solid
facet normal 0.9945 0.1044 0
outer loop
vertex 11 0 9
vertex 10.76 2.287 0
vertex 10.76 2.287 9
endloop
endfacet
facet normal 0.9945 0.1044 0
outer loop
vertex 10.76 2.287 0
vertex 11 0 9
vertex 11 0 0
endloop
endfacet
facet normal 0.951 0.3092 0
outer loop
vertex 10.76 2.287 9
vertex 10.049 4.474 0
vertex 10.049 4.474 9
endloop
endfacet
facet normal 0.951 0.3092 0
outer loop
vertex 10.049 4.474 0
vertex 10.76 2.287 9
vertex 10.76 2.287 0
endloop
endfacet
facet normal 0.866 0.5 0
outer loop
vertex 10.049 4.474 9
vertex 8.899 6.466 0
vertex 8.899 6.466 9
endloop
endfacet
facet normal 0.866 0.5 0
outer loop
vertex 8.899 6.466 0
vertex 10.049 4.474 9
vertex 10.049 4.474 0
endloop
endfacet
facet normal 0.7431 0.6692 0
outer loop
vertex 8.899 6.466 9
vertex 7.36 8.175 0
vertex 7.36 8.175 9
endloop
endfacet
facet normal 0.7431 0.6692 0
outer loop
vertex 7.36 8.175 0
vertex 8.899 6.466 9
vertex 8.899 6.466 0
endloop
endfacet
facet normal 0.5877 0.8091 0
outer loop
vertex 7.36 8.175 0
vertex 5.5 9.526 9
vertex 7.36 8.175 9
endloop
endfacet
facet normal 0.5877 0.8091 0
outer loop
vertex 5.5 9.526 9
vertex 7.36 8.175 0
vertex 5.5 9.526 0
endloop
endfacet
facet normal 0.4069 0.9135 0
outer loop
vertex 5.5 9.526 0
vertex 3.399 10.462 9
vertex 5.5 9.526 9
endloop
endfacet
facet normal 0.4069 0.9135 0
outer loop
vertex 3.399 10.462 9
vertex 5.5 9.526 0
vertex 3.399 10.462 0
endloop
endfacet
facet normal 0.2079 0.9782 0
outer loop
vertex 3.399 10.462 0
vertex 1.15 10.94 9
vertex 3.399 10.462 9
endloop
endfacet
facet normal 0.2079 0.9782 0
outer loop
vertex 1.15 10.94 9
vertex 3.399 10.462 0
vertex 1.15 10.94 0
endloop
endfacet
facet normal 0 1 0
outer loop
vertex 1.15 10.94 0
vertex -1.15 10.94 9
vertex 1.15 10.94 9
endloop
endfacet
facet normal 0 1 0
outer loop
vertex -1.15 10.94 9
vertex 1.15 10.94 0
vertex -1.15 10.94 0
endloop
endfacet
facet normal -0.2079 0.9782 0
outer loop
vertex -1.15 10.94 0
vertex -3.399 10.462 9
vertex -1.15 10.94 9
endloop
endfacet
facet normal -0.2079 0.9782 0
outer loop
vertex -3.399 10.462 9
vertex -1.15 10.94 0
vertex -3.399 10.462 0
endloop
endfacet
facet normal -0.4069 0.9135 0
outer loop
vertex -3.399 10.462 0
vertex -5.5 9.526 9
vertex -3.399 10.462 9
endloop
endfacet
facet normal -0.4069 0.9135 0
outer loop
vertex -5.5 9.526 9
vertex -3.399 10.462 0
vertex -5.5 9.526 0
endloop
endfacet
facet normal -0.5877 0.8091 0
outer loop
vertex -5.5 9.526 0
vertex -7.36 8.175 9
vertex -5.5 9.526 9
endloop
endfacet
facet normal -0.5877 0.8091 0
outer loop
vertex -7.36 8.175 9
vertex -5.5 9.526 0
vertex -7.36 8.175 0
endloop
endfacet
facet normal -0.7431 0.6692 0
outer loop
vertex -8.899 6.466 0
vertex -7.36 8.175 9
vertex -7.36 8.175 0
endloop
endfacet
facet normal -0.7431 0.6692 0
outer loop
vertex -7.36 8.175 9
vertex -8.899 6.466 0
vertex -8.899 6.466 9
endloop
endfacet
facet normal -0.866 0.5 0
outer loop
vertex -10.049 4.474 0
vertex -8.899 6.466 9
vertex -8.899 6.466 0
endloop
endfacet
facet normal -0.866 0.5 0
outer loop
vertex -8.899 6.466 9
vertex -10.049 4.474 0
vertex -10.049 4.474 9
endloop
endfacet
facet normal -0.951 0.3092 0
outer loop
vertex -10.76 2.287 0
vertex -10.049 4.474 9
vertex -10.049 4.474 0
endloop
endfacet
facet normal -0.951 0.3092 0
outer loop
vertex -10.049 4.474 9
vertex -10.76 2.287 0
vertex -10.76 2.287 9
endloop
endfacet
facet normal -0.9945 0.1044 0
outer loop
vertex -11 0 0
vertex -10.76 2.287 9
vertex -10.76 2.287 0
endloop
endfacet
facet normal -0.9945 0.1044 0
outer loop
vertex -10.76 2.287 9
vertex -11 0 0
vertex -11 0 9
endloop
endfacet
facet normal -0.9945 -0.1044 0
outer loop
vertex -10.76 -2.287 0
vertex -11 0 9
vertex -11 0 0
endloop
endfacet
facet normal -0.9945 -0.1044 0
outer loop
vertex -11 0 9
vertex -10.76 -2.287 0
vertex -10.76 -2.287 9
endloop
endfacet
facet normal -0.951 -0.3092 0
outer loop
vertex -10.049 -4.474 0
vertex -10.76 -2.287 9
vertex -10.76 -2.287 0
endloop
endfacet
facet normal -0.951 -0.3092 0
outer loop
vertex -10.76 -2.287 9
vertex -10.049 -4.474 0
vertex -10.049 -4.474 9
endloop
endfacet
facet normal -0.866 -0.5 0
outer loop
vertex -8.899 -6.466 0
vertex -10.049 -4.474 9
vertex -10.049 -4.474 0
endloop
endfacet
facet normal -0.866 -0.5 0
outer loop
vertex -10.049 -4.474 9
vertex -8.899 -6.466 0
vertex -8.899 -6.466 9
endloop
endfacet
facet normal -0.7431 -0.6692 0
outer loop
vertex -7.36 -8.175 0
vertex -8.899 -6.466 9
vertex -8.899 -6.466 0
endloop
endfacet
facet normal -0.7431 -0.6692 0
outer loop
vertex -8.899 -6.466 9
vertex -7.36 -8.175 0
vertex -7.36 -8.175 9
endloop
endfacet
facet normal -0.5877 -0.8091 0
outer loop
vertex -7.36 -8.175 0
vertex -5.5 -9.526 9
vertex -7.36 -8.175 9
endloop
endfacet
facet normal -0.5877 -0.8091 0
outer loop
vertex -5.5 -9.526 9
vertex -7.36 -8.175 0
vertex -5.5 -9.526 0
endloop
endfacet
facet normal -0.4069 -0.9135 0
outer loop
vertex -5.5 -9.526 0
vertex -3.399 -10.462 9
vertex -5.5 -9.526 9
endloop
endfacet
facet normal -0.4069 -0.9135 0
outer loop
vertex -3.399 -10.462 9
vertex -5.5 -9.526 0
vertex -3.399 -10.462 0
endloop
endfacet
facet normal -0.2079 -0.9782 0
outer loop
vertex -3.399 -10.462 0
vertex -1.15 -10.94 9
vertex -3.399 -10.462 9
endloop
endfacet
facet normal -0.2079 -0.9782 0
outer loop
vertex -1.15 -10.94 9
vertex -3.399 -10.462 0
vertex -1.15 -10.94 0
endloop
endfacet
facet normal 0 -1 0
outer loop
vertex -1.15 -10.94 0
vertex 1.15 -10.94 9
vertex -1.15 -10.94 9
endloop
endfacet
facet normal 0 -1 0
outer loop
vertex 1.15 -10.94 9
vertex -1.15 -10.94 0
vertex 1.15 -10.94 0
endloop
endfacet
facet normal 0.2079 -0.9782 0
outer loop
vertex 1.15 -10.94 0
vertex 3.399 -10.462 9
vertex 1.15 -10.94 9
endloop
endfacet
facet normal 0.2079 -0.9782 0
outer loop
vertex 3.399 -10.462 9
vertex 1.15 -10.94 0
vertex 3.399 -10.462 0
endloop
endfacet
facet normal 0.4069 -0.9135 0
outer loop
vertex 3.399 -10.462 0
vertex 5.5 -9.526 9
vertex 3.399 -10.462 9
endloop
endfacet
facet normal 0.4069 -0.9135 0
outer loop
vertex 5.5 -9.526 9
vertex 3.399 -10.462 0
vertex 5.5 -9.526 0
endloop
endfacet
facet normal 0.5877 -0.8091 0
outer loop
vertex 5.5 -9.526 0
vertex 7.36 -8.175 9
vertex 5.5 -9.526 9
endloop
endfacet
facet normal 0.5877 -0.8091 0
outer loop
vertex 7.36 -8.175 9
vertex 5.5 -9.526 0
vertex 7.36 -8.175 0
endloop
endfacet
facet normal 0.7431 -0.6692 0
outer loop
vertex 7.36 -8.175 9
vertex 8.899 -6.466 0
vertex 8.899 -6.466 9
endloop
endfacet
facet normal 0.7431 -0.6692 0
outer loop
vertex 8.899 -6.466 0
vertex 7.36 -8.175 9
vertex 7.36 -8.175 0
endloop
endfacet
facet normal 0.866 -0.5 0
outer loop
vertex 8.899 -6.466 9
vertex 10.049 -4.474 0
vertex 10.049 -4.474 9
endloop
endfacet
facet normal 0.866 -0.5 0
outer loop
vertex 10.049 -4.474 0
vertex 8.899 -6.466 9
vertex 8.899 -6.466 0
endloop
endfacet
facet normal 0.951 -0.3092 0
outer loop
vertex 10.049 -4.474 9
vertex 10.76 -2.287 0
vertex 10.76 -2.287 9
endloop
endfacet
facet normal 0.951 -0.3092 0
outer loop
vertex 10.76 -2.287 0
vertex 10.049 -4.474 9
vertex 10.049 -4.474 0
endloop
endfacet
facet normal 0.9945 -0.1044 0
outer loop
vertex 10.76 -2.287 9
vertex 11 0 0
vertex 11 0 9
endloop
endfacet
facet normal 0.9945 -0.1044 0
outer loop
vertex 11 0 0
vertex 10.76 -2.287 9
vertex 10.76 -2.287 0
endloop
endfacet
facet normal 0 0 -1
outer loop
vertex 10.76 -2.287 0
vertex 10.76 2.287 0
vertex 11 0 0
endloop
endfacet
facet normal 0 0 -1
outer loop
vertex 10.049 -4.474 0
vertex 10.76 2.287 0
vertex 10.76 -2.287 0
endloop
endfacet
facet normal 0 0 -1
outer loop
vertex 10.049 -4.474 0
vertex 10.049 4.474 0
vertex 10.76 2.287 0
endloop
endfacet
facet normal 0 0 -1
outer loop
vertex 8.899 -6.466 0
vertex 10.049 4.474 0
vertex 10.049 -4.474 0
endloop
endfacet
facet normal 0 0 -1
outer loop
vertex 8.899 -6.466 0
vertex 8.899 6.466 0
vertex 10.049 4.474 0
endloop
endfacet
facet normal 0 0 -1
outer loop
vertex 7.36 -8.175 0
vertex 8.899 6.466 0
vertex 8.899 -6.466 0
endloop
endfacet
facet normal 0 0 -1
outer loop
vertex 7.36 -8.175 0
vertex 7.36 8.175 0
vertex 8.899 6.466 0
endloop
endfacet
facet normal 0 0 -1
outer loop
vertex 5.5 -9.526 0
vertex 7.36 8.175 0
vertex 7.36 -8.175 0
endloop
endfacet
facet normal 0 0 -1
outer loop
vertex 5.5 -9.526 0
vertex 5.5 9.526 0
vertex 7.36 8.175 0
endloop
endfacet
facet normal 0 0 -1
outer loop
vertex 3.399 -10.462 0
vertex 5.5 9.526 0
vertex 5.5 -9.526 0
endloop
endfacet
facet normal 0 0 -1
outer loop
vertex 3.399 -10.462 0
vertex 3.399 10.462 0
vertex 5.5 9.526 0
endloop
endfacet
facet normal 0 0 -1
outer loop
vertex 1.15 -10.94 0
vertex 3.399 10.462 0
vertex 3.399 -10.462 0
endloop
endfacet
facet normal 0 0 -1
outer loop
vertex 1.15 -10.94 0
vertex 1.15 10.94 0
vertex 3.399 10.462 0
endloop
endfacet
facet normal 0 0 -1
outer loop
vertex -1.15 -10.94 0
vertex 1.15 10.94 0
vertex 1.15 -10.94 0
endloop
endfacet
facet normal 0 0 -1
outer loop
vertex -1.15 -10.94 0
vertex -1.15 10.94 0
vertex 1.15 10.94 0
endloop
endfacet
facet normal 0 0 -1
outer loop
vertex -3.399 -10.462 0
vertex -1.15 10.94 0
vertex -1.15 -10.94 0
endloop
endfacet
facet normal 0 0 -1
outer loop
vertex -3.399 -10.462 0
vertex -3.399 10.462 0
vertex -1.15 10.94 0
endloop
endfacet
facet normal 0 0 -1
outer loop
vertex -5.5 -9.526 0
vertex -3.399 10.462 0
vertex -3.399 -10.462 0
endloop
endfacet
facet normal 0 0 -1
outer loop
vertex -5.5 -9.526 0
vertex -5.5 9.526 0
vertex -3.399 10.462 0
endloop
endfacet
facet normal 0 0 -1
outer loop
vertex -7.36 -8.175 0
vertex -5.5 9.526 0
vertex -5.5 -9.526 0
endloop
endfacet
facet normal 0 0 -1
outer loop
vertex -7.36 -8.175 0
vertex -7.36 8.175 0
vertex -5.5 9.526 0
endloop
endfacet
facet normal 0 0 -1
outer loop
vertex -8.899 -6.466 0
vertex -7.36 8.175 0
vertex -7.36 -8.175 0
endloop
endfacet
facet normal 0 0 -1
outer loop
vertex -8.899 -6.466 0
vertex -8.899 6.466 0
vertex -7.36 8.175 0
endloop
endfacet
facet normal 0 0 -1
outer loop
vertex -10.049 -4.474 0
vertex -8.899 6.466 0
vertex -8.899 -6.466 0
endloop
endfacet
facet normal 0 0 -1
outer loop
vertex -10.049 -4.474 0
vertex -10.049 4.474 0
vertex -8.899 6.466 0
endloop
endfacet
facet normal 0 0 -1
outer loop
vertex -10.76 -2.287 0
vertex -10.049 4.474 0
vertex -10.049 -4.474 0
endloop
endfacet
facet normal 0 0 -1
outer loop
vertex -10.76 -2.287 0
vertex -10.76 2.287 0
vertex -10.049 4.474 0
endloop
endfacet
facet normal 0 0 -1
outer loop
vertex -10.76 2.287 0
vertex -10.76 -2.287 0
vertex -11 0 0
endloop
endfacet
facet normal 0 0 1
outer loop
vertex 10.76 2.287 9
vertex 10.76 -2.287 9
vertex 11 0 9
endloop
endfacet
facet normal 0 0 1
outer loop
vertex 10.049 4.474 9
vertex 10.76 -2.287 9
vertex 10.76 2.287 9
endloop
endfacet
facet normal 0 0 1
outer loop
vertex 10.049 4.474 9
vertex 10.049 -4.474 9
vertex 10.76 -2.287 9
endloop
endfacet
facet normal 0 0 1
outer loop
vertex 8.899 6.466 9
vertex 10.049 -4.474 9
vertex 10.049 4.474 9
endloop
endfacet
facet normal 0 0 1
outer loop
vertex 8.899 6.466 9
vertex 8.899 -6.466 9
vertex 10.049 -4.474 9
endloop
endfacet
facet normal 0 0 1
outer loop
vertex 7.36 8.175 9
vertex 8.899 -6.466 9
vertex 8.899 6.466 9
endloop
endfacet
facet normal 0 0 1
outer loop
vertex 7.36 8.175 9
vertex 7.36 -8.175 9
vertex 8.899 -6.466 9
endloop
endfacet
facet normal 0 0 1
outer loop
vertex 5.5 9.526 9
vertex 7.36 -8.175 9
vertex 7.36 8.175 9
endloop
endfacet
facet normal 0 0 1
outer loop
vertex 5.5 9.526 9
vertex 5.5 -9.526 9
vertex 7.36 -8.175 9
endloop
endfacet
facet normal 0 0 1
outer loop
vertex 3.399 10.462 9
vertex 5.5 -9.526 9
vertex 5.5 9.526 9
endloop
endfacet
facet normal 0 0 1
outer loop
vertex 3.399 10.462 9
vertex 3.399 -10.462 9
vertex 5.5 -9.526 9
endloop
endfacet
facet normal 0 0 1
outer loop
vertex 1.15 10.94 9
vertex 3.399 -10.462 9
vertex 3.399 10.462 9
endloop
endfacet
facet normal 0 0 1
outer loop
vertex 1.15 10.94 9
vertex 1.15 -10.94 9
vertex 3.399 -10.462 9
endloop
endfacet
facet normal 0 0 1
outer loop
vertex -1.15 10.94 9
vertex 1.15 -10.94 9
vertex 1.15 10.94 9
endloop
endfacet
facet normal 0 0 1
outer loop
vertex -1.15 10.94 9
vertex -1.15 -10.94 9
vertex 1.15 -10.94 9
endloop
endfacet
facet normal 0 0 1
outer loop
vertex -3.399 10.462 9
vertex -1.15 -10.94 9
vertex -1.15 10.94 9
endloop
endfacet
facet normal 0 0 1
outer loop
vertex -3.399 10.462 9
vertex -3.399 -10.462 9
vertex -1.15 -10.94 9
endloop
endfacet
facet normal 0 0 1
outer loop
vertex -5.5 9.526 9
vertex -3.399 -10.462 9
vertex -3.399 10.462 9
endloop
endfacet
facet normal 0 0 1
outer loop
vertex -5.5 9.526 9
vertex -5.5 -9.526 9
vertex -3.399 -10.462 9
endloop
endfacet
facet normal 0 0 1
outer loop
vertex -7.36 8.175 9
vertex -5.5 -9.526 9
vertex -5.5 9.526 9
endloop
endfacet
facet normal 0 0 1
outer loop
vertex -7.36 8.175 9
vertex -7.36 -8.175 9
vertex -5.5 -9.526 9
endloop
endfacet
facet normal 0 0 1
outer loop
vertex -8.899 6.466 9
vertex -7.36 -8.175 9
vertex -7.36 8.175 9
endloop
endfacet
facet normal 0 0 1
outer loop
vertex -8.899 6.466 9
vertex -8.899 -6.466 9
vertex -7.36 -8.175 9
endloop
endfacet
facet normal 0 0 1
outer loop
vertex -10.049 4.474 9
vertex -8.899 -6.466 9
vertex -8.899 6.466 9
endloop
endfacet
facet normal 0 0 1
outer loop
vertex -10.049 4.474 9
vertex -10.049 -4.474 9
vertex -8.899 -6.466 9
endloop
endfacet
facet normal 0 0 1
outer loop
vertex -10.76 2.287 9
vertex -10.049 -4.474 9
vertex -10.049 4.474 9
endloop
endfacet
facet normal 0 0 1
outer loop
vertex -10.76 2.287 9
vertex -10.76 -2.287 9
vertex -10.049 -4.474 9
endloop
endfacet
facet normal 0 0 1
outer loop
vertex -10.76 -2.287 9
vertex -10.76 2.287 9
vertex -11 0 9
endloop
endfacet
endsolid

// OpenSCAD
// Generated by SolidPython 1.0.1 on 2020-07-29 00:46:44


cylinder(h = 9, r1 = 11, r2 = 11);
/***********************************************
*********      SolidPython code:      **********
************************************************
 
# import packages: SolidPython
from solid import *
from solid.utils import *
from itertools import chain, combinations, permutations


class Resize:

    def __init__(self, scad_file):
        self.scad_file = scad_file
        #self.scad_file = import_scad(scad_file)
        # cone/cylinder param:
        self.r1 = 0
        self.r2 = 0
        self.h = 0
        # rectangular prism param:
        self.w = 0
        self.l = 0
        # ellipse param:
        self.r = 0

    # import OpenScad code (file name corresponds to shape)


    # classify shape + parameters
    def assign(self, param1, param2, param3):
        if self.scad_file == 'cone.scad':
            self.r1 = param1
            self.r2 = param2
            self.h = param3
        elif self.scad_file == 'cylinder.scad':
            self.r1 = param1
            self.r2 = param2
            self.h = param3
        elif self.scad_file == 'rectangularPrism.scad':
            self.h = param1
            self.l = param2
            self.w = param3
        else:
            self.r = param1
            self.h = param2

    # resize parameters
    def iterate(self):
        x = range(3, 20, 2)
        i = 1
        if self.scad_file == 'cone.scad':
            tempList = list(permutations(x, 2))
            for temp in tempList:
                param1 = temp[0]
                param2 = temp[1]
                filepath = 'produced_scad_files/' + 'cone' + str(param1) + '_' + str(param2) + '_' + '.scad'
                scad_render_to_file(cylinder(h=param1, r1=param2, r2=0), filepath)

        elif self.scad_file == 'cylinder.scad':
            tempList = list(permutations(x, 3))
            for temp in tempList:
                param1 = temp[0]
                param2 = temp[1]
                filepath = 'produced_scad_files/' + 'cylinder' + str(param1) + '_' + str(param2) + '_' + '.scad'
                scad_render_to_file(cylinder(h=param1, r1=param2, r2=param2), filepath)

        elif self.scad_file == 'rectangularPrism.scad':
            tempList = list(permutations(x, 3))
            for temp in tempList:
                param1 = temp[0]
                param2 = temp[1]
                param3 = temp[2]
                filepath = 'produced_scad_files/' + 'rectangularPrism' + str(param1) + '_' + str(param2) + '_' + str(
                    param3) + '.scad'
                scad_render_to_file(cube(size=(param1, param2, param3)), filepath)

        elif self.scad_file == 'ellipse.scad':
            tempList = list(permutations(x, 4))
            for temp in tempList:
                param1 = temp[0]
                param2 = temp[1]
                param3 = temp[2]
                param4 = temp[3]
                filepath = 'produced_scad_files/' + 'ellipse' + str(param1) + '_' + str(param2) + '_' + str(param3) + '_' + str(param4) + '.scad'
                scad_render_to_file(scale([param1, param2, param3])(sphere(r=param4)), filepath)

    def render_to_scadfile(self):
        scad_render_to_file(scad, 'example.scad') 
 
************************************************/
